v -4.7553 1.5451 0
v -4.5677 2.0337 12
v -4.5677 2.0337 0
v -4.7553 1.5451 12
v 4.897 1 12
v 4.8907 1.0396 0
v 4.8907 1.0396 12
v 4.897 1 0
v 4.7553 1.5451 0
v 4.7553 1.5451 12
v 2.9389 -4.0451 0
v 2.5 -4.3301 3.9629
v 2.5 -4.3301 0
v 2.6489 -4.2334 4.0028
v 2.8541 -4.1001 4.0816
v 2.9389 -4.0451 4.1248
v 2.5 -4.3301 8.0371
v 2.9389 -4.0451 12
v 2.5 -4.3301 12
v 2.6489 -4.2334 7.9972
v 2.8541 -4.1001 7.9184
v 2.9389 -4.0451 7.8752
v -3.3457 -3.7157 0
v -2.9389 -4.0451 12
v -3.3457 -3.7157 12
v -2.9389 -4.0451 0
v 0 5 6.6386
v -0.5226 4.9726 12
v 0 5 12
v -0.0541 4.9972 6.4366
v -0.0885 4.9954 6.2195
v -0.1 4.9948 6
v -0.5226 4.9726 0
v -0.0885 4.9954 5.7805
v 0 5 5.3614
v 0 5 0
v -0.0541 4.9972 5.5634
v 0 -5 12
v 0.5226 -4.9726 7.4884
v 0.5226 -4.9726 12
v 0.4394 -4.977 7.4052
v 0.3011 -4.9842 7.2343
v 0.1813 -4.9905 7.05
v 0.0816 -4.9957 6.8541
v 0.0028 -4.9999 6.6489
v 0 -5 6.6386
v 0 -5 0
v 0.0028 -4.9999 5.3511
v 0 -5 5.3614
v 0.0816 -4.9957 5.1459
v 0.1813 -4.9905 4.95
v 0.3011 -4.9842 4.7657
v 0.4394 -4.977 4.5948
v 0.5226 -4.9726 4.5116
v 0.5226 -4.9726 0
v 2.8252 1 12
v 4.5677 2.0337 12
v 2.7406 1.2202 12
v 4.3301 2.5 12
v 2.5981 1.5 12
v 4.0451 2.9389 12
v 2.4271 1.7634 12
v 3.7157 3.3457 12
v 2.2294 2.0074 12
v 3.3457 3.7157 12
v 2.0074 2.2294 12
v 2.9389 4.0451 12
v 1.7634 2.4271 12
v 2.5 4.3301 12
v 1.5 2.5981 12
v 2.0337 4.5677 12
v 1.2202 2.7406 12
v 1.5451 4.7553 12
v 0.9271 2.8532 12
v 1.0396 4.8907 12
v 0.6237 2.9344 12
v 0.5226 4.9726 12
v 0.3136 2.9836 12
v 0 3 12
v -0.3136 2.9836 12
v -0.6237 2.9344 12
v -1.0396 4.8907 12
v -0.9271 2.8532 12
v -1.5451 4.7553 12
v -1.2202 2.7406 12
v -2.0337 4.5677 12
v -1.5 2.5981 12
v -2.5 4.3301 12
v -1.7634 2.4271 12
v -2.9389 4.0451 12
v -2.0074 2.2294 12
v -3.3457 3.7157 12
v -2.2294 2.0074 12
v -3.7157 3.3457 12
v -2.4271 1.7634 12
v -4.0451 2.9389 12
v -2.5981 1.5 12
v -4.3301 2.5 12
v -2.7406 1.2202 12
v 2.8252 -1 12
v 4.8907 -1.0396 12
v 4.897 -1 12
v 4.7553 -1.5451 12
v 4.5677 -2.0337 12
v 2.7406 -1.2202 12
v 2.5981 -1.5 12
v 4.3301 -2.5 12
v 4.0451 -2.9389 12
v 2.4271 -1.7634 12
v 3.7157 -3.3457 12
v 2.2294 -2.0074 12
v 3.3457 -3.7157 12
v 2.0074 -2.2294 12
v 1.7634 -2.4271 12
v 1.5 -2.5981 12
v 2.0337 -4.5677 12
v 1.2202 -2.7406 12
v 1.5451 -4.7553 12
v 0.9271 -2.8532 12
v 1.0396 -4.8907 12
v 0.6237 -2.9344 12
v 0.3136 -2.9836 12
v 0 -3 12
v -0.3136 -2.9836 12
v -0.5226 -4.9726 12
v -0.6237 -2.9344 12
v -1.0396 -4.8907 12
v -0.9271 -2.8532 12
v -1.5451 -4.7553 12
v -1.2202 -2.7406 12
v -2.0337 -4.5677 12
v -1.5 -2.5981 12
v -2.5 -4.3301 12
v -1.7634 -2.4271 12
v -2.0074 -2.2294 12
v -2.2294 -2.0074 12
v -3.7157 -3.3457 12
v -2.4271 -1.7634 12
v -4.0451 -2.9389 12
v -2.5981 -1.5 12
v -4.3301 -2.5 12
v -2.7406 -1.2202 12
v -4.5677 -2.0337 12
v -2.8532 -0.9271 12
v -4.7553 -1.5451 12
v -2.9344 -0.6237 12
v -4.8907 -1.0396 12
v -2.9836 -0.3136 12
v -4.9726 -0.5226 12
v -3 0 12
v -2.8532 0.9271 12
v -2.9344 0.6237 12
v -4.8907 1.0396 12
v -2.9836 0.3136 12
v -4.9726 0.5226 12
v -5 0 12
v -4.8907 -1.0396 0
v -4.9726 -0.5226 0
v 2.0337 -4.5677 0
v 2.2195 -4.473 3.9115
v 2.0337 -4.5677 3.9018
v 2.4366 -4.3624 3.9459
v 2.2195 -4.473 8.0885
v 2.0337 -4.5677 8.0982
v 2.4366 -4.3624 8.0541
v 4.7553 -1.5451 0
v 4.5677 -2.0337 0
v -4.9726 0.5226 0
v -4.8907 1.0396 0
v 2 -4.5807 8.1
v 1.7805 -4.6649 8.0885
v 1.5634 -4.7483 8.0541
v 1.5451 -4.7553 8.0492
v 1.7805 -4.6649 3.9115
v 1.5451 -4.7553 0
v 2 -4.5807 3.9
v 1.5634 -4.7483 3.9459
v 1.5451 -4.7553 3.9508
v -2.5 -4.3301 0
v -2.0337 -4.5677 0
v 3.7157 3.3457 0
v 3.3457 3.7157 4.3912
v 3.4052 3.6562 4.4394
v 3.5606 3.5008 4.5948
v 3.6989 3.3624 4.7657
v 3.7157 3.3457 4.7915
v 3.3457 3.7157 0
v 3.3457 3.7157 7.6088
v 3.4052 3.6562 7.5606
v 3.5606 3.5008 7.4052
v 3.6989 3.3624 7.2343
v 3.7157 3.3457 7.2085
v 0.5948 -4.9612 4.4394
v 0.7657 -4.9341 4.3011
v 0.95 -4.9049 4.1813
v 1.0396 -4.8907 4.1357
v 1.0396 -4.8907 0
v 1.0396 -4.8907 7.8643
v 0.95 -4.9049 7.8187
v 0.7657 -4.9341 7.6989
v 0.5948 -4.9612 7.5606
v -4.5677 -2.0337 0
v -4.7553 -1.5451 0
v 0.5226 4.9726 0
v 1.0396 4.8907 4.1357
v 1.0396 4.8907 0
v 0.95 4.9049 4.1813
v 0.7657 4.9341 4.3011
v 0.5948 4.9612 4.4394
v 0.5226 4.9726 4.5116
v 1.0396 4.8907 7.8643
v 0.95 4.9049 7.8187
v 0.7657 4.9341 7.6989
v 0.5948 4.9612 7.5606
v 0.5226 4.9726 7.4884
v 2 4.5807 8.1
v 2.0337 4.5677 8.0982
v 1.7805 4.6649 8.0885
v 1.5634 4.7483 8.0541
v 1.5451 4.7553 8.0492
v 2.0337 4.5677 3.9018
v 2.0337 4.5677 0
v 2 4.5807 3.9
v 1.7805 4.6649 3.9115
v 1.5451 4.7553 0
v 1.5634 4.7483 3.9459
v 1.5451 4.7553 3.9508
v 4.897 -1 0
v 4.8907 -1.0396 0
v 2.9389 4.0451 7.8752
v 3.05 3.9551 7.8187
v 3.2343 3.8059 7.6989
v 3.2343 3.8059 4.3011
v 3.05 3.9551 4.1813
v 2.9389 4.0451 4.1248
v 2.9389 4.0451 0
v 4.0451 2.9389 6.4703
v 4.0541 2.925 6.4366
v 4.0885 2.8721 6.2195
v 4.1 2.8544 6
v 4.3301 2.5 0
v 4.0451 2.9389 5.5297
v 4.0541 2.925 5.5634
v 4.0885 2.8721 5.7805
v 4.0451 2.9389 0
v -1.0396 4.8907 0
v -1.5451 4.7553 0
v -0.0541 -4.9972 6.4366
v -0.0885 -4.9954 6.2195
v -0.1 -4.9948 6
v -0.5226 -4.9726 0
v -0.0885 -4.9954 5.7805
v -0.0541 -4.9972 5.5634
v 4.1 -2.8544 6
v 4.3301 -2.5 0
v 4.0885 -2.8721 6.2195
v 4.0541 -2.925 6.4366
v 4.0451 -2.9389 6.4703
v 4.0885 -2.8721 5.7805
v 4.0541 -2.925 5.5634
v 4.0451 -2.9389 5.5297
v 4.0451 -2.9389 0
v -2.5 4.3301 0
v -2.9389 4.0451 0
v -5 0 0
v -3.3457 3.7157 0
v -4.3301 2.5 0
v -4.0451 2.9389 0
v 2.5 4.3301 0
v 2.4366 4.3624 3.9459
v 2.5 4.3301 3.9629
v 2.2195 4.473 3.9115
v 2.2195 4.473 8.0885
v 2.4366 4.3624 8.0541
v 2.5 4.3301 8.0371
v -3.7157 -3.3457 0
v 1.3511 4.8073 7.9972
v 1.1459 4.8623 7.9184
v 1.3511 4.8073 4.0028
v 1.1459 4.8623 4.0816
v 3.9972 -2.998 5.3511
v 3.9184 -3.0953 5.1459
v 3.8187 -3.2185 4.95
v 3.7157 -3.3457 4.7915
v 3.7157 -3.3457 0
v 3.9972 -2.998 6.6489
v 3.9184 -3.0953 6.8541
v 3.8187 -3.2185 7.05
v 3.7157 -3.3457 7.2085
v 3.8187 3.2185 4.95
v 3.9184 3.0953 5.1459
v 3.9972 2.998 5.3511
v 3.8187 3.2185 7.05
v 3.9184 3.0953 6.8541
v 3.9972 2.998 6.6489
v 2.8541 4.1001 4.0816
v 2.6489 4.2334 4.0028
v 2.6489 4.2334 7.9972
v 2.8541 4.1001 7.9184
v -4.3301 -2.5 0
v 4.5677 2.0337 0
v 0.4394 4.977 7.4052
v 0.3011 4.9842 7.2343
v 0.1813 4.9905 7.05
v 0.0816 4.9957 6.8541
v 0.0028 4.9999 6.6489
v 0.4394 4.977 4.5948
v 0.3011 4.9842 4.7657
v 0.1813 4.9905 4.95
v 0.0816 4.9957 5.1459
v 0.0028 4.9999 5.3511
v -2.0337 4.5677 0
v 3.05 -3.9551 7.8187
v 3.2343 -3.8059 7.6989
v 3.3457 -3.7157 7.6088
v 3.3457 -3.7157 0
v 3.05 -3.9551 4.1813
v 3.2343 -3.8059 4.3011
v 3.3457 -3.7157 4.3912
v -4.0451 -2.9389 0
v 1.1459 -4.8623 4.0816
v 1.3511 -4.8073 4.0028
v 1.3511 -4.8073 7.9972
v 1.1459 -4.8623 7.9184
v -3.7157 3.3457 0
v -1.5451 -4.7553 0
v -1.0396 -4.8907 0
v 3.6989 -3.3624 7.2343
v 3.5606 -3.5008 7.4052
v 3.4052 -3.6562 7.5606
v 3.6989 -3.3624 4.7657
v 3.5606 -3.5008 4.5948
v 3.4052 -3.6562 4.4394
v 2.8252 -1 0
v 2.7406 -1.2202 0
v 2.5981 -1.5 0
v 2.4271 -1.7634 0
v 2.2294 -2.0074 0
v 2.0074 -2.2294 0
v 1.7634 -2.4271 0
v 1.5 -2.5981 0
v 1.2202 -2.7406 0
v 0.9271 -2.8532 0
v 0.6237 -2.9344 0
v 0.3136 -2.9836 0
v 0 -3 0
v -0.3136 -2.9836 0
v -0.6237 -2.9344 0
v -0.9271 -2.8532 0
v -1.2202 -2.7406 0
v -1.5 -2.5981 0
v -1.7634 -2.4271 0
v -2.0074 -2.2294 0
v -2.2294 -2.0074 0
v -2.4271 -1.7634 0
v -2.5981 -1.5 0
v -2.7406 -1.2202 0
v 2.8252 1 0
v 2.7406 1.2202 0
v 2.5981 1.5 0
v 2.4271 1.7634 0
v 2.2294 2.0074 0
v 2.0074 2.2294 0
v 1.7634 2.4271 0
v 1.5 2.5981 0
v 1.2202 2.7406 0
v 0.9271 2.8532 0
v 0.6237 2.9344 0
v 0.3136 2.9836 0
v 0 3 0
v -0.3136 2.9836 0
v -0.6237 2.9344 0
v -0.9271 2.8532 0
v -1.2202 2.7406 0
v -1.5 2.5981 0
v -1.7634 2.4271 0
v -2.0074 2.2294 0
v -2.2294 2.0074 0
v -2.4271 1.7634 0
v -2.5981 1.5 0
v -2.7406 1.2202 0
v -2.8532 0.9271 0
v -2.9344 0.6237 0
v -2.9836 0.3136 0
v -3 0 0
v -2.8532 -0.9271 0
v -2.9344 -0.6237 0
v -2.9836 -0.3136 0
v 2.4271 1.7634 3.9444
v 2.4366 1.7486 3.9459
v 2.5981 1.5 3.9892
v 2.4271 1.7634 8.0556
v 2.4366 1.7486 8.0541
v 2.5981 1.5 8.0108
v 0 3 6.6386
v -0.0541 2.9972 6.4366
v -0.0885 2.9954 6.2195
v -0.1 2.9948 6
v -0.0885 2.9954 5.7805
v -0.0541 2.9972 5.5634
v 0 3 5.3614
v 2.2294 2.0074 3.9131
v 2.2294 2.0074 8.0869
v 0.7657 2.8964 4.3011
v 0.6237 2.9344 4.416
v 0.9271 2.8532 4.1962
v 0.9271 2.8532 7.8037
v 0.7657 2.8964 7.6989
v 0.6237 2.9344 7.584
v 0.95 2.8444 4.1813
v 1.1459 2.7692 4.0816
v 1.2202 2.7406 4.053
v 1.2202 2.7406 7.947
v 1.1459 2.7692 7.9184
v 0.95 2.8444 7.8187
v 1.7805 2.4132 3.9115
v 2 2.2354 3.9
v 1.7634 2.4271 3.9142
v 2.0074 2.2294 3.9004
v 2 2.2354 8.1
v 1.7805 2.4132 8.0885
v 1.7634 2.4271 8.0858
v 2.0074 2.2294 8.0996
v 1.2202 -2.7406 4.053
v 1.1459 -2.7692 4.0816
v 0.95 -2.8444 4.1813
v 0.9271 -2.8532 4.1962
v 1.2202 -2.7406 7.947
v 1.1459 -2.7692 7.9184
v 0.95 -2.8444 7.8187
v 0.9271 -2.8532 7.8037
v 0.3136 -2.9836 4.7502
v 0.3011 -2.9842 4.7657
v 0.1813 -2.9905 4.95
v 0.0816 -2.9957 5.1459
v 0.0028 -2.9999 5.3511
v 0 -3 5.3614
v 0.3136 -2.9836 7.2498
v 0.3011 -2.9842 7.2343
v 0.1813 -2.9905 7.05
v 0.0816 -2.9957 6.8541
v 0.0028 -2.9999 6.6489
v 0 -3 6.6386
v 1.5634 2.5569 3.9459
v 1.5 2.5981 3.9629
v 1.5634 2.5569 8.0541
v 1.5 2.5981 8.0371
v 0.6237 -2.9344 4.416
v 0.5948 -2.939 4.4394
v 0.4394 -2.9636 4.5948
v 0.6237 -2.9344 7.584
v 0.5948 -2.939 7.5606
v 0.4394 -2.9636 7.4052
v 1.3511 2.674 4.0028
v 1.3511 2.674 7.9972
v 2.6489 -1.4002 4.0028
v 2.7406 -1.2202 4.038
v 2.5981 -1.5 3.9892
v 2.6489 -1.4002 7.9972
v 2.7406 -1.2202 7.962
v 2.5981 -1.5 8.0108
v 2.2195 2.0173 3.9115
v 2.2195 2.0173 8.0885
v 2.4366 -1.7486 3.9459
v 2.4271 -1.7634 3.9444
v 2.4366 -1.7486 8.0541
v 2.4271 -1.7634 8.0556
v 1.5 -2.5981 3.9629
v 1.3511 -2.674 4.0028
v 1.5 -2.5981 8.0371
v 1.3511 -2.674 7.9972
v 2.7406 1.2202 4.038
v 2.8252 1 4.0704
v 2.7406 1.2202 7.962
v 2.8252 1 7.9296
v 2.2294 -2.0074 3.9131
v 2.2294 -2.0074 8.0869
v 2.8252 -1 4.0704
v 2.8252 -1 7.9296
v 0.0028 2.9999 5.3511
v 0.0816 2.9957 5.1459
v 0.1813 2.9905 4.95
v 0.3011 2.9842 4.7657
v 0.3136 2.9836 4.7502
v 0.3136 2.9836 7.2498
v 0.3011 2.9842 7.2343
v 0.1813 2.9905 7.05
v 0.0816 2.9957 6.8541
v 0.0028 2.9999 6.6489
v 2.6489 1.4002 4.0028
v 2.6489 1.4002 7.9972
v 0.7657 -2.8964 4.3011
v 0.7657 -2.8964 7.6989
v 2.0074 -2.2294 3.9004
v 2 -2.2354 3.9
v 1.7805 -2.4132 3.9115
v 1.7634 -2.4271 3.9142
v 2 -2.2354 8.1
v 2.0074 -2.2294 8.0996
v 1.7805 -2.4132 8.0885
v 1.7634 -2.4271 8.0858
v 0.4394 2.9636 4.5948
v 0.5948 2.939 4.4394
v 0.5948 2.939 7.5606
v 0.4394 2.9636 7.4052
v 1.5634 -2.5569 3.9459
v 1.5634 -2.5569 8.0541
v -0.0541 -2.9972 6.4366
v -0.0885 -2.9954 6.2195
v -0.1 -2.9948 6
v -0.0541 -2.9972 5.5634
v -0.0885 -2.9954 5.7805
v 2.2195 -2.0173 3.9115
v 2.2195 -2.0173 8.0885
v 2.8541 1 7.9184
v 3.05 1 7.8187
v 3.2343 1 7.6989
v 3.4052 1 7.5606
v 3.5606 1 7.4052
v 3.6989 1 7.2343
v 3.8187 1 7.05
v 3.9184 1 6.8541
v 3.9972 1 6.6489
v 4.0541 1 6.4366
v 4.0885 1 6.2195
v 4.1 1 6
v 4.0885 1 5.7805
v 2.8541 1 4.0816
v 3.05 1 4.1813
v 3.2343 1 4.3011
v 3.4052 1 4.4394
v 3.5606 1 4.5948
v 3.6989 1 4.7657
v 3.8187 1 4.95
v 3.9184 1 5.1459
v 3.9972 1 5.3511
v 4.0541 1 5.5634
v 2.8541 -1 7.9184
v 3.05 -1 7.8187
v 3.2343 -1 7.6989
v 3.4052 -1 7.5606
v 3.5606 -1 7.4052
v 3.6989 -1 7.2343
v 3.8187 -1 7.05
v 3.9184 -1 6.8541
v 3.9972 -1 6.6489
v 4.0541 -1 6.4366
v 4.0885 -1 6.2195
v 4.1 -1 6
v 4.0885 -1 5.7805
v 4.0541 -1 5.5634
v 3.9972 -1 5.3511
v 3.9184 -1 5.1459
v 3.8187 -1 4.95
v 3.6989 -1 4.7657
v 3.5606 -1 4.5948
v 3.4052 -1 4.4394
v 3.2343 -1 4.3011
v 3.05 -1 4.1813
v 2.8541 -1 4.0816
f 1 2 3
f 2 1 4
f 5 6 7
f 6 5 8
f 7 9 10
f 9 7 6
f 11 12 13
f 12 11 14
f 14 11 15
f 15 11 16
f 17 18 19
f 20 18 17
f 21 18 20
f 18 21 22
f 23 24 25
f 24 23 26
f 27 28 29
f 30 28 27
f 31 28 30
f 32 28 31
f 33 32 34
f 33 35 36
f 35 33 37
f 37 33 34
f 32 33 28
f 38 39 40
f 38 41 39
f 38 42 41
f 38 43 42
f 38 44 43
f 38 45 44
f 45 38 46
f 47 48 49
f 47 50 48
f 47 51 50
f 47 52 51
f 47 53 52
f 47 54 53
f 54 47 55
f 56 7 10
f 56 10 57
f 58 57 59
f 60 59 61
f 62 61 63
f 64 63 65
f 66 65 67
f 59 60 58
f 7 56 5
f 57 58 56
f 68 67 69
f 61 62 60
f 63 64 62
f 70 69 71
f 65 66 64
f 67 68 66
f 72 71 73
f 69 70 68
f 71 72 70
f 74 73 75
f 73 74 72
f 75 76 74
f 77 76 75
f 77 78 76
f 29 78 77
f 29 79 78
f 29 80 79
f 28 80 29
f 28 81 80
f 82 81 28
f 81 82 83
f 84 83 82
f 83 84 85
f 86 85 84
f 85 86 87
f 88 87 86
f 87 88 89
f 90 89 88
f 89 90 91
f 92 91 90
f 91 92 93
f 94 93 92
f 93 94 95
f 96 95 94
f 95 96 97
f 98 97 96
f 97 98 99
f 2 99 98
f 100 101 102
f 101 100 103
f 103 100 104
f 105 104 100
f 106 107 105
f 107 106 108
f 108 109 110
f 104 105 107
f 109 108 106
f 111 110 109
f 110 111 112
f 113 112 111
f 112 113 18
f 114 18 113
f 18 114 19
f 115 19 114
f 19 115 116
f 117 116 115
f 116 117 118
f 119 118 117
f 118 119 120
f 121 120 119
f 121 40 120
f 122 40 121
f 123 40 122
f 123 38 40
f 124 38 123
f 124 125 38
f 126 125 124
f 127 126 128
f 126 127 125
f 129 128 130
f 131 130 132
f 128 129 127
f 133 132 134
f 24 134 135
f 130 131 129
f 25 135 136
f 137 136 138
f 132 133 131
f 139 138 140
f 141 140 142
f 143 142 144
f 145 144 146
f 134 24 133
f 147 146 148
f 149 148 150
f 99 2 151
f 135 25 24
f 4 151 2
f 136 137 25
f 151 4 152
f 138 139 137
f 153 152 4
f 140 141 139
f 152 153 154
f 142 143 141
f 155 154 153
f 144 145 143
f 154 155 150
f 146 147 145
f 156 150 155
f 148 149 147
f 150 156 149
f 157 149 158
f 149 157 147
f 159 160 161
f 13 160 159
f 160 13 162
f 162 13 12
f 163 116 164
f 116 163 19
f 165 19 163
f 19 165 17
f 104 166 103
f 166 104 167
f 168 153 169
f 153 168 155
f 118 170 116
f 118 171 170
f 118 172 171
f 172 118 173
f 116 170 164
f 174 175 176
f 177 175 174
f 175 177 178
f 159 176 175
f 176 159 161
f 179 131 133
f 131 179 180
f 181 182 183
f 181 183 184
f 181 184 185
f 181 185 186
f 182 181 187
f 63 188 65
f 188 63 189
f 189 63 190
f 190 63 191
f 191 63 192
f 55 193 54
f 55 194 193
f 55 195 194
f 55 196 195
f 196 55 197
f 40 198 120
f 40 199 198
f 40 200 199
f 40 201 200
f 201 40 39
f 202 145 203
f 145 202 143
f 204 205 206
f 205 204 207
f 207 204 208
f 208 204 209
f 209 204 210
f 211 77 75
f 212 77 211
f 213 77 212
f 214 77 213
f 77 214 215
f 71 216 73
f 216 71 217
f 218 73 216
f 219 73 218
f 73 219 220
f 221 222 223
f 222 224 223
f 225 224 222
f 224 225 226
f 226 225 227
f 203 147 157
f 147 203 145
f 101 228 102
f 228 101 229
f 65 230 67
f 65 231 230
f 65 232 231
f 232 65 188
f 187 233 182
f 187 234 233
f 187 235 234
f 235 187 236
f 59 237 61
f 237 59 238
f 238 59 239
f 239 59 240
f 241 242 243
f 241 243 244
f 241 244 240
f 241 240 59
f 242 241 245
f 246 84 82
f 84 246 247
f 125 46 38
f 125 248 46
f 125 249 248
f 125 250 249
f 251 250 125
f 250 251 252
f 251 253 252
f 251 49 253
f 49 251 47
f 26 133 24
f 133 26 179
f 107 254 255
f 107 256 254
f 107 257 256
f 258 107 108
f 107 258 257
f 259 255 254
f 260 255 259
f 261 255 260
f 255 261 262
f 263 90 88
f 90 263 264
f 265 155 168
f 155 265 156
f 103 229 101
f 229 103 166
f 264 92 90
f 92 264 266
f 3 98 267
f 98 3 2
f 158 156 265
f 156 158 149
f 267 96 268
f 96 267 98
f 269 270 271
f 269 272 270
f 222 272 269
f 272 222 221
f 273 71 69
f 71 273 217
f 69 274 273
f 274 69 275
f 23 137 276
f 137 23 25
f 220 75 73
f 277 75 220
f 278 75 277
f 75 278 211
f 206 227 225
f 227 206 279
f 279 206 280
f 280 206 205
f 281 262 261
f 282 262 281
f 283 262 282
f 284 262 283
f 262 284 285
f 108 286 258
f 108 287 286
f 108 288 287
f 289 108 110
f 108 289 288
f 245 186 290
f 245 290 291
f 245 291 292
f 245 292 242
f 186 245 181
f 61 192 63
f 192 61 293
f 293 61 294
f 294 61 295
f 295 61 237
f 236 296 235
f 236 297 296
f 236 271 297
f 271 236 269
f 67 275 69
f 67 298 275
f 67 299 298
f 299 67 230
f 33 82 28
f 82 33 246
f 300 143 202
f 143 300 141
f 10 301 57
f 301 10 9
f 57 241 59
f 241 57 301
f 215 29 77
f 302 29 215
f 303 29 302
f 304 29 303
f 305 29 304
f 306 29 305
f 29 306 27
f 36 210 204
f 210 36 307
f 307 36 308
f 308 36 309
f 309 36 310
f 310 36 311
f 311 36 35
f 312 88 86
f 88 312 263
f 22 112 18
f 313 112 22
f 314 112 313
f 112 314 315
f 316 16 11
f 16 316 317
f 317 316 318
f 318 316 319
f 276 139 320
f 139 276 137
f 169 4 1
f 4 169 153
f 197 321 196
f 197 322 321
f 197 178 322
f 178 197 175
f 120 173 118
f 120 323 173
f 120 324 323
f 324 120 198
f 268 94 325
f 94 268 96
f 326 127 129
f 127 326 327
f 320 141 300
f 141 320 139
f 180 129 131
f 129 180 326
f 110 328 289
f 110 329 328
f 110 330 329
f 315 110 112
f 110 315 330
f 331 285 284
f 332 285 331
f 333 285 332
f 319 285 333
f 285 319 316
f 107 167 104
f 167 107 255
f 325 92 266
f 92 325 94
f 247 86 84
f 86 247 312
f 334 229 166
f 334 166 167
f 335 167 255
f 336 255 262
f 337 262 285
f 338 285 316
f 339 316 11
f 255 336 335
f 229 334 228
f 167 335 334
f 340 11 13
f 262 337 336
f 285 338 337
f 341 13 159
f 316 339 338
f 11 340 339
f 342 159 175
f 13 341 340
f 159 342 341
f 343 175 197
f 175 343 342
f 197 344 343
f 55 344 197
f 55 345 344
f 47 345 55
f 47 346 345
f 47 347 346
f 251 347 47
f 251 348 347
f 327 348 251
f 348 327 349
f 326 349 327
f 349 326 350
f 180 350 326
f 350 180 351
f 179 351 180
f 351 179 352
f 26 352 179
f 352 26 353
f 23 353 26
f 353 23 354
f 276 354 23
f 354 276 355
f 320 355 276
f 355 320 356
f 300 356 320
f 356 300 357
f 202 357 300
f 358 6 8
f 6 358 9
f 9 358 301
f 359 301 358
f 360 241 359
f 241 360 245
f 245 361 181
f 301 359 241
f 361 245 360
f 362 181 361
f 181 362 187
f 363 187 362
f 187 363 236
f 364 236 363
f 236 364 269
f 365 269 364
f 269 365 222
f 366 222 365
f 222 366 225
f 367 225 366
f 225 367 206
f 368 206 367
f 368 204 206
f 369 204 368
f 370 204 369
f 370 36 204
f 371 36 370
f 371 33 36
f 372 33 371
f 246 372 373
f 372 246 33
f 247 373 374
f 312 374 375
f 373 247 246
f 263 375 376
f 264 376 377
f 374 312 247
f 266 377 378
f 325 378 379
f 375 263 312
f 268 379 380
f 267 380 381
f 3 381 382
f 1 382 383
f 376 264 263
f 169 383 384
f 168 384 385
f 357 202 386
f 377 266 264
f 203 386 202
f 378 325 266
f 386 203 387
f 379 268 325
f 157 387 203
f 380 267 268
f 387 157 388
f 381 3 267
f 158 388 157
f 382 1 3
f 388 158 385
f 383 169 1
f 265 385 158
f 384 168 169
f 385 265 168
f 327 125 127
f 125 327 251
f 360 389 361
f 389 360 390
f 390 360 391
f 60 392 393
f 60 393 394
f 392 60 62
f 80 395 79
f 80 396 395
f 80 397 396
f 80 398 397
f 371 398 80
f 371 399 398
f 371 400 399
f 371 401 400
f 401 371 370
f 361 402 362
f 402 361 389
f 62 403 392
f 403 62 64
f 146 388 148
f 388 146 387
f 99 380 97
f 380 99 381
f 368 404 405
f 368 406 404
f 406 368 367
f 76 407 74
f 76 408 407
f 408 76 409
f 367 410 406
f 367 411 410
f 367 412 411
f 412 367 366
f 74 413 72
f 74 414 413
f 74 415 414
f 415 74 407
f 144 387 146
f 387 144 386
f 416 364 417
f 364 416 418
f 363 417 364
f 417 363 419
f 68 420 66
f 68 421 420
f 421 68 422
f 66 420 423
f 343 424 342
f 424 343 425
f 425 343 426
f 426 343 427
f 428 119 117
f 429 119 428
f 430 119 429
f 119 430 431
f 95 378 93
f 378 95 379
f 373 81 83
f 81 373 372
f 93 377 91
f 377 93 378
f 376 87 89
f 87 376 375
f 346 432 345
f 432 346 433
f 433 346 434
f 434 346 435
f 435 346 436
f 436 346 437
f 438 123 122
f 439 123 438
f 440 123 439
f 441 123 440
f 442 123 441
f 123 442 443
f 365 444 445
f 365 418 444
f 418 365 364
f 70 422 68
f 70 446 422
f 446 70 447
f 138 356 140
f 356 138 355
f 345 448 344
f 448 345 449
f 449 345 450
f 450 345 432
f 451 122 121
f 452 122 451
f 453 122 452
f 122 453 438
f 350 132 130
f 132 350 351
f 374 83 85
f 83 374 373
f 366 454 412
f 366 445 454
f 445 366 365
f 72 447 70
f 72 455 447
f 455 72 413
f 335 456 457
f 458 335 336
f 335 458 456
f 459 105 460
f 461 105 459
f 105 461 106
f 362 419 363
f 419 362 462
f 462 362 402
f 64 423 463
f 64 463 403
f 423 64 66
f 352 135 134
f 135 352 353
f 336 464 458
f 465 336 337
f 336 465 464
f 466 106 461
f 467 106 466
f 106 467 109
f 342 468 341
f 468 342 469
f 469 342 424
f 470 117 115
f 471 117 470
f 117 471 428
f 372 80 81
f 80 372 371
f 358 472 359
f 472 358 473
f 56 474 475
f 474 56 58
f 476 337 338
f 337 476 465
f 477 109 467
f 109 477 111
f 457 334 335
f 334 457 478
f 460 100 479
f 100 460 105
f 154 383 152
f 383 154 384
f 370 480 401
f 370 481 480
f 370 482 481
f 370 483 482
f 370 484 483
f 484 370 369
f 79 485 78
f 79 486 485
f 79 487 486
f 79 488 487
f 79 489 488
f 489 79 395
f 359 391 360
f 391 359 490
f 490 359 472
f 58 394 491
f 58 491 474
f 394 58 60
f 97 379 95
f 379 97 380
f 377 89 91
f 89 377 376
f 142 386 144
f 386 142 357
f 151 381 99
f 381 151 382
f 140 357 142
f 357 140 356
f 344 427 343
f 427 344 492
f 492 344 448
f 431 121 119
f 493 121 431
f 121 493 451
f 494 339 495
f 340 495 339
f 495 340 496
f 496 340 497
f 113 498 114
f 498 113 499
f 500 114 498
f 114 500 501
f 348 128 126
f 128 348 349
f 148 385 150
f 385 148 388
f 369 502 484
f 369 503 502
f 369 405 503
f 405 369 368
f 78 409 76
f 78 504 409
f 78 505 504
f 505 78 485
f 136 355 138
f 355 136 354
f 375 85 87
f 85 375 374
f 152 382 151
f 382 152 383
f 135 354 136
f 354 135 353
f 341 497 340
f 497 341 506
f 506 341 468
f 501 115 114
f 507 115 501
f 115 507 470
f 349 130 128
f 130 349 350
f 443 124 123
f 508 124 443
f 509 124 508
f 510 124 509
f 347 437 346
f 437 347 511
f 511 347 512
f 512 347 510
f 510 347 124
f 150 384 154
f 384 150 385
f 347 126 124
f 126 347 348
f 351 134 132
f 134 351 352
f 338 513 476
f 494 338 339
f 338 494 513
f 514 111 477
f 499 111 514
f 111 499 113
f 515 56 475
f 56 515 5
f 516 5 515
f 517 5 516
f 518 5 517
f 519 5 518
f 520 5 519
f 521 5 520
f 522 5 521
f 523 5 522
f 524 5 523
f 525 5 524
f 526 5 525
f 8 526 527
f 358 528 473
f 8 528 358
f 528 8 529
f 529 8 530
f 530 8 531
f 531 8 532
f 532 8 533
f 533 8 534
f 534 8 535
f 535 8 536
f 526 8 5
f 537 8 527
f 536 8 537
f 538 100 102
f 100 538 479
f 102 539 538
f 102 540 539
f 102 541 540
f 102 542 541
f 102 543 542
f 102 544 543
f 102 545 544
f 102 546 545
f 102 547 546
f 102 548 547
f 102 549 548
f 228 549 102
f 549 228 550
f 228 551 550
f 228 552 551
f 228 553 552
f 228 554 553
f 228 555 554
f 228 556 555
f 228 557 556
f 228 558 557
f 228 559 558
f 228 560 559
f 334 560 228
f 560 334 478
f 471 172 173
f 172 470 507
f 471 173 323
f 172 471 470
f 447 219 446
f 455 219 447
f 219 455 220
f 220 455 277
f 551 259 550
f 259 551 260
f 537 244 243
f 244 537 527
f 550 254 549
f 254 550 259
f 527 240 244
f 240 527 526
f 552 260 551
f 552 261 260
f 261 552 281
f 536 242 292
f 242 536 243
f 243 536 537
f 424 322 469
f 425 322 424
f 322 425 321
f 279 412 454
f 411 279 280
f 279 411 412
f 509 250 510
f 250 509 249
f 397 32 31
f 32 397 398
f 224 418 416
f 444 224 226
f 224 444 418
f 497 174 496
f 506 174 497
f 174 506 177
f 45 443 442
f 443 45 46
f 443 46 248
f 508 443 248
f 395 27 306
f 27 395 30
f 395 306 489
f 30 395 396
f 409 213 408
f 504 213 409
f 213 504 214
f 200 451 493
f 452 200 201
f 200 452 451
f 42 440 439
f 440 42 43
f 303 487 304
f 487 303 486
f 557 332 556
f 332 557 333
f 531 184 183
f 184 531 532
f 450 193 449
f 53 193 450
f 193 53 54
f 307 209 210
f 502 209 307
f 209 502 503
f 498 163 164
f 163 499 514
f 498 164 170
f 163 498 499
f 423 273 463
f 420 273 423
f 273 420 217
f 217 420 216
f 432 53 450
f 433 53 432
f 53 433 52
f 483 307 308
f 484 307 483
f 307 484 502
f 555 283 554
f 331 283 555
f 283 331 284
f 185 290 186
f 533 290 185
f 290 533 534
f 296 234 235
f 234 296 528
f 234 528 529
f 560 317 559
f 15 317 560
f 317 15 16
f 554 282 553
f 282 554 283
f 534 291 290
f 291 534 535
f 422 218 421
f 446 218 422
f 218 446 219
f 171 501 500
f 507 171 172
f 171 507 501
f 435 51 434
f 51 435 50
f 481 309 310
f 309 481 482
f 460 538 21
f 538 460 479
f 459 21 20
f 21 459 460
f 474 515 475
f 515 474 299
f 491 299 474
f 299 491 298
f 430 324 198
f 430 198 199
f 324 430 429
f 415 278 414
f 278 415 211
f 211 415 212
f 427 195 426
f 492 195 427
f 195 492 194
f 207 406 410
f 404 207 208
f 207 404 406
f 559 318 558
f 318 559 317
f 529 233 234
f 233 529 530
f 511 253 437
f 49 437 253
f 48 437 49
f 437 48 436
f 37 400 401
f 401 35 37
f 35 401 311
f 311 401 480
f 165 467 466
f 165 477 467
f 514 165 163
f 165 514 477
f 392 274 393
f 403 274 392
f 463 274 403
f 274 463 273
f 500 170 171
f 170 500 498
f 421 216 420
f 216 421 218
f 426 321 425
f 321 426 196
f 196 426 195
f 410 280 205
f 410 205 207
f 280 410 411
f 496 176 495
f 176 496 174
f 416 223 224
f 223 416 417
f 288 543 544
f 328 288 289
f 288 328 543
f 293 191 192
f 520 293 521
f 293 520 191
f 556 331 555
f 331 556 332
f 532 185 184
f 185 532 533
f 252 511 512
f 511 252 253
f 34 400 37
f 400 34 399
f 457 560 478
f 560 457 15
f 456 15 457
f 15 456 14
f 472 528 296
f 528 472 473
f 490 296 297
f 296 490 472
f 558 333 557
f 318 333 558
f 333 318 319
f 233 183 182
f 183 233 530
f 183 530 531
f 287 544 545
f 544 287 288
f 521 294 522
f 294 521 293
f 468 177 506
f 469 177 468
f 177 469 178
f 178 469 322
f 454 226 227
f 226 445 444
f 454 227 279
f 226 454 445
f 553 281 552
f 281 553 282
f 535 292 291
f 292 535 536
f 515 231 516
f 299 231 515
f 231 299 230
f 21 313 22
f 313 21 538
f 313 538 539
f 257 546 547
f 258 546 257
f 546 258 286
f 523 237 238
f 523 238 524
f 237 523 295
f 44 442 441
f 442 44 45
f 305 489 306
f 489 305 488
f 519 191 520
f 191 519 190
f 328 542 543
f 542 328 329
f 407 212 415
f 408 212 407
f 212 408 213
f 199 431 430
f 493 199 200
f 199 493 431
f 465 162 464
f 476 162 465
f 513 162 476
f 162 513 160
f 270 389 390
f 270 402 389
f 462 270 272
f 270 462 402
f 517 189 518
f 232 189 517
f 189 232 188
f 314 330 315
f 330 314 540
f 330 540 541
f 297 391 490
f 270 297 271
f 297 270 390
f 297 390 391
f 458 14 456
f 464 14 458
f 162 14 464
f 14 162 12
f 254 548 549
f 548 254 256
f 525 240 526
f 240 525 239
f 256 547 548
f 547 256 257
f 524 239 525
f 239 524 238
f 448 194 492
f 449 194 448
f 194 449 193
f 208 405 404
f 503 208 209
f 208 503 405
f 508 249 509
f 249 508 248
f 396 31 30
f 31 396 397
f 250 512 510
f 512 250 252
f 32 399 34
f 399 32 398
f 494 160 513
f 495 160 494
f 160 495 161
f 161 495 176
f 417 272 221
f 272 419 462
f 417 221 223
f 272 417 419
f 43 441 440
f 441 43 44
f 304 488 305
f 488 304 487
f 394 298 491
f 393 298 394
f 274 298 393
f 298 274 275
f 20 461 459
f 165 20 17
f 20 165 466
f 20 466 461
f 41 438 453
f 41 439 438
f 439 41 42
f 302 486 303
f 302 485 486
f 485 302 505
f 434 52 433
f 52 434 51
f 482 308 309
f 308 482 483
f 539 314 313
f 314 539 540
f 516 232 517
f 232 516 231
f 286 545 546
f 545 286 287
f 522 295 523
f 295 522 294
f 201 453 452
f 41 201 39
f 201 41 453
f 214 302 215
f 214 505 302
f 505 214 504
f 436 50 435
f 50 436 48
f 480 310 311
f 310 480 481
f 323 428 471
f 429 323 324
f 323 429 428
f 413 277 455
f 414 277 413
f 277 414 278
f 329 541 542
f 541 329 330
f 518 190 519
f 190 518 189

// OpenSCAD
// C-style pipe clamp.
$fn = 60;
eps = 0.02;
pipe_d = 6;
wall = 2;
outer_d = pipe_d+2*wall;
width = 12;
difference() {
    cylinder(d=outer_d,h=width);
    translate([0,0,-eps]) cylinder(d=pipe_d,h=width+2*eps);
    translate([0,-1,-eps]) cube([outer_d/2+eps,2,width+2*eps]);
    translate([outer_d/2-3,-outer_d/2-eps,width/2]) rotate([-90,0,0]) cylinder(d=4.2,h=outer_d+2*eps);
}
